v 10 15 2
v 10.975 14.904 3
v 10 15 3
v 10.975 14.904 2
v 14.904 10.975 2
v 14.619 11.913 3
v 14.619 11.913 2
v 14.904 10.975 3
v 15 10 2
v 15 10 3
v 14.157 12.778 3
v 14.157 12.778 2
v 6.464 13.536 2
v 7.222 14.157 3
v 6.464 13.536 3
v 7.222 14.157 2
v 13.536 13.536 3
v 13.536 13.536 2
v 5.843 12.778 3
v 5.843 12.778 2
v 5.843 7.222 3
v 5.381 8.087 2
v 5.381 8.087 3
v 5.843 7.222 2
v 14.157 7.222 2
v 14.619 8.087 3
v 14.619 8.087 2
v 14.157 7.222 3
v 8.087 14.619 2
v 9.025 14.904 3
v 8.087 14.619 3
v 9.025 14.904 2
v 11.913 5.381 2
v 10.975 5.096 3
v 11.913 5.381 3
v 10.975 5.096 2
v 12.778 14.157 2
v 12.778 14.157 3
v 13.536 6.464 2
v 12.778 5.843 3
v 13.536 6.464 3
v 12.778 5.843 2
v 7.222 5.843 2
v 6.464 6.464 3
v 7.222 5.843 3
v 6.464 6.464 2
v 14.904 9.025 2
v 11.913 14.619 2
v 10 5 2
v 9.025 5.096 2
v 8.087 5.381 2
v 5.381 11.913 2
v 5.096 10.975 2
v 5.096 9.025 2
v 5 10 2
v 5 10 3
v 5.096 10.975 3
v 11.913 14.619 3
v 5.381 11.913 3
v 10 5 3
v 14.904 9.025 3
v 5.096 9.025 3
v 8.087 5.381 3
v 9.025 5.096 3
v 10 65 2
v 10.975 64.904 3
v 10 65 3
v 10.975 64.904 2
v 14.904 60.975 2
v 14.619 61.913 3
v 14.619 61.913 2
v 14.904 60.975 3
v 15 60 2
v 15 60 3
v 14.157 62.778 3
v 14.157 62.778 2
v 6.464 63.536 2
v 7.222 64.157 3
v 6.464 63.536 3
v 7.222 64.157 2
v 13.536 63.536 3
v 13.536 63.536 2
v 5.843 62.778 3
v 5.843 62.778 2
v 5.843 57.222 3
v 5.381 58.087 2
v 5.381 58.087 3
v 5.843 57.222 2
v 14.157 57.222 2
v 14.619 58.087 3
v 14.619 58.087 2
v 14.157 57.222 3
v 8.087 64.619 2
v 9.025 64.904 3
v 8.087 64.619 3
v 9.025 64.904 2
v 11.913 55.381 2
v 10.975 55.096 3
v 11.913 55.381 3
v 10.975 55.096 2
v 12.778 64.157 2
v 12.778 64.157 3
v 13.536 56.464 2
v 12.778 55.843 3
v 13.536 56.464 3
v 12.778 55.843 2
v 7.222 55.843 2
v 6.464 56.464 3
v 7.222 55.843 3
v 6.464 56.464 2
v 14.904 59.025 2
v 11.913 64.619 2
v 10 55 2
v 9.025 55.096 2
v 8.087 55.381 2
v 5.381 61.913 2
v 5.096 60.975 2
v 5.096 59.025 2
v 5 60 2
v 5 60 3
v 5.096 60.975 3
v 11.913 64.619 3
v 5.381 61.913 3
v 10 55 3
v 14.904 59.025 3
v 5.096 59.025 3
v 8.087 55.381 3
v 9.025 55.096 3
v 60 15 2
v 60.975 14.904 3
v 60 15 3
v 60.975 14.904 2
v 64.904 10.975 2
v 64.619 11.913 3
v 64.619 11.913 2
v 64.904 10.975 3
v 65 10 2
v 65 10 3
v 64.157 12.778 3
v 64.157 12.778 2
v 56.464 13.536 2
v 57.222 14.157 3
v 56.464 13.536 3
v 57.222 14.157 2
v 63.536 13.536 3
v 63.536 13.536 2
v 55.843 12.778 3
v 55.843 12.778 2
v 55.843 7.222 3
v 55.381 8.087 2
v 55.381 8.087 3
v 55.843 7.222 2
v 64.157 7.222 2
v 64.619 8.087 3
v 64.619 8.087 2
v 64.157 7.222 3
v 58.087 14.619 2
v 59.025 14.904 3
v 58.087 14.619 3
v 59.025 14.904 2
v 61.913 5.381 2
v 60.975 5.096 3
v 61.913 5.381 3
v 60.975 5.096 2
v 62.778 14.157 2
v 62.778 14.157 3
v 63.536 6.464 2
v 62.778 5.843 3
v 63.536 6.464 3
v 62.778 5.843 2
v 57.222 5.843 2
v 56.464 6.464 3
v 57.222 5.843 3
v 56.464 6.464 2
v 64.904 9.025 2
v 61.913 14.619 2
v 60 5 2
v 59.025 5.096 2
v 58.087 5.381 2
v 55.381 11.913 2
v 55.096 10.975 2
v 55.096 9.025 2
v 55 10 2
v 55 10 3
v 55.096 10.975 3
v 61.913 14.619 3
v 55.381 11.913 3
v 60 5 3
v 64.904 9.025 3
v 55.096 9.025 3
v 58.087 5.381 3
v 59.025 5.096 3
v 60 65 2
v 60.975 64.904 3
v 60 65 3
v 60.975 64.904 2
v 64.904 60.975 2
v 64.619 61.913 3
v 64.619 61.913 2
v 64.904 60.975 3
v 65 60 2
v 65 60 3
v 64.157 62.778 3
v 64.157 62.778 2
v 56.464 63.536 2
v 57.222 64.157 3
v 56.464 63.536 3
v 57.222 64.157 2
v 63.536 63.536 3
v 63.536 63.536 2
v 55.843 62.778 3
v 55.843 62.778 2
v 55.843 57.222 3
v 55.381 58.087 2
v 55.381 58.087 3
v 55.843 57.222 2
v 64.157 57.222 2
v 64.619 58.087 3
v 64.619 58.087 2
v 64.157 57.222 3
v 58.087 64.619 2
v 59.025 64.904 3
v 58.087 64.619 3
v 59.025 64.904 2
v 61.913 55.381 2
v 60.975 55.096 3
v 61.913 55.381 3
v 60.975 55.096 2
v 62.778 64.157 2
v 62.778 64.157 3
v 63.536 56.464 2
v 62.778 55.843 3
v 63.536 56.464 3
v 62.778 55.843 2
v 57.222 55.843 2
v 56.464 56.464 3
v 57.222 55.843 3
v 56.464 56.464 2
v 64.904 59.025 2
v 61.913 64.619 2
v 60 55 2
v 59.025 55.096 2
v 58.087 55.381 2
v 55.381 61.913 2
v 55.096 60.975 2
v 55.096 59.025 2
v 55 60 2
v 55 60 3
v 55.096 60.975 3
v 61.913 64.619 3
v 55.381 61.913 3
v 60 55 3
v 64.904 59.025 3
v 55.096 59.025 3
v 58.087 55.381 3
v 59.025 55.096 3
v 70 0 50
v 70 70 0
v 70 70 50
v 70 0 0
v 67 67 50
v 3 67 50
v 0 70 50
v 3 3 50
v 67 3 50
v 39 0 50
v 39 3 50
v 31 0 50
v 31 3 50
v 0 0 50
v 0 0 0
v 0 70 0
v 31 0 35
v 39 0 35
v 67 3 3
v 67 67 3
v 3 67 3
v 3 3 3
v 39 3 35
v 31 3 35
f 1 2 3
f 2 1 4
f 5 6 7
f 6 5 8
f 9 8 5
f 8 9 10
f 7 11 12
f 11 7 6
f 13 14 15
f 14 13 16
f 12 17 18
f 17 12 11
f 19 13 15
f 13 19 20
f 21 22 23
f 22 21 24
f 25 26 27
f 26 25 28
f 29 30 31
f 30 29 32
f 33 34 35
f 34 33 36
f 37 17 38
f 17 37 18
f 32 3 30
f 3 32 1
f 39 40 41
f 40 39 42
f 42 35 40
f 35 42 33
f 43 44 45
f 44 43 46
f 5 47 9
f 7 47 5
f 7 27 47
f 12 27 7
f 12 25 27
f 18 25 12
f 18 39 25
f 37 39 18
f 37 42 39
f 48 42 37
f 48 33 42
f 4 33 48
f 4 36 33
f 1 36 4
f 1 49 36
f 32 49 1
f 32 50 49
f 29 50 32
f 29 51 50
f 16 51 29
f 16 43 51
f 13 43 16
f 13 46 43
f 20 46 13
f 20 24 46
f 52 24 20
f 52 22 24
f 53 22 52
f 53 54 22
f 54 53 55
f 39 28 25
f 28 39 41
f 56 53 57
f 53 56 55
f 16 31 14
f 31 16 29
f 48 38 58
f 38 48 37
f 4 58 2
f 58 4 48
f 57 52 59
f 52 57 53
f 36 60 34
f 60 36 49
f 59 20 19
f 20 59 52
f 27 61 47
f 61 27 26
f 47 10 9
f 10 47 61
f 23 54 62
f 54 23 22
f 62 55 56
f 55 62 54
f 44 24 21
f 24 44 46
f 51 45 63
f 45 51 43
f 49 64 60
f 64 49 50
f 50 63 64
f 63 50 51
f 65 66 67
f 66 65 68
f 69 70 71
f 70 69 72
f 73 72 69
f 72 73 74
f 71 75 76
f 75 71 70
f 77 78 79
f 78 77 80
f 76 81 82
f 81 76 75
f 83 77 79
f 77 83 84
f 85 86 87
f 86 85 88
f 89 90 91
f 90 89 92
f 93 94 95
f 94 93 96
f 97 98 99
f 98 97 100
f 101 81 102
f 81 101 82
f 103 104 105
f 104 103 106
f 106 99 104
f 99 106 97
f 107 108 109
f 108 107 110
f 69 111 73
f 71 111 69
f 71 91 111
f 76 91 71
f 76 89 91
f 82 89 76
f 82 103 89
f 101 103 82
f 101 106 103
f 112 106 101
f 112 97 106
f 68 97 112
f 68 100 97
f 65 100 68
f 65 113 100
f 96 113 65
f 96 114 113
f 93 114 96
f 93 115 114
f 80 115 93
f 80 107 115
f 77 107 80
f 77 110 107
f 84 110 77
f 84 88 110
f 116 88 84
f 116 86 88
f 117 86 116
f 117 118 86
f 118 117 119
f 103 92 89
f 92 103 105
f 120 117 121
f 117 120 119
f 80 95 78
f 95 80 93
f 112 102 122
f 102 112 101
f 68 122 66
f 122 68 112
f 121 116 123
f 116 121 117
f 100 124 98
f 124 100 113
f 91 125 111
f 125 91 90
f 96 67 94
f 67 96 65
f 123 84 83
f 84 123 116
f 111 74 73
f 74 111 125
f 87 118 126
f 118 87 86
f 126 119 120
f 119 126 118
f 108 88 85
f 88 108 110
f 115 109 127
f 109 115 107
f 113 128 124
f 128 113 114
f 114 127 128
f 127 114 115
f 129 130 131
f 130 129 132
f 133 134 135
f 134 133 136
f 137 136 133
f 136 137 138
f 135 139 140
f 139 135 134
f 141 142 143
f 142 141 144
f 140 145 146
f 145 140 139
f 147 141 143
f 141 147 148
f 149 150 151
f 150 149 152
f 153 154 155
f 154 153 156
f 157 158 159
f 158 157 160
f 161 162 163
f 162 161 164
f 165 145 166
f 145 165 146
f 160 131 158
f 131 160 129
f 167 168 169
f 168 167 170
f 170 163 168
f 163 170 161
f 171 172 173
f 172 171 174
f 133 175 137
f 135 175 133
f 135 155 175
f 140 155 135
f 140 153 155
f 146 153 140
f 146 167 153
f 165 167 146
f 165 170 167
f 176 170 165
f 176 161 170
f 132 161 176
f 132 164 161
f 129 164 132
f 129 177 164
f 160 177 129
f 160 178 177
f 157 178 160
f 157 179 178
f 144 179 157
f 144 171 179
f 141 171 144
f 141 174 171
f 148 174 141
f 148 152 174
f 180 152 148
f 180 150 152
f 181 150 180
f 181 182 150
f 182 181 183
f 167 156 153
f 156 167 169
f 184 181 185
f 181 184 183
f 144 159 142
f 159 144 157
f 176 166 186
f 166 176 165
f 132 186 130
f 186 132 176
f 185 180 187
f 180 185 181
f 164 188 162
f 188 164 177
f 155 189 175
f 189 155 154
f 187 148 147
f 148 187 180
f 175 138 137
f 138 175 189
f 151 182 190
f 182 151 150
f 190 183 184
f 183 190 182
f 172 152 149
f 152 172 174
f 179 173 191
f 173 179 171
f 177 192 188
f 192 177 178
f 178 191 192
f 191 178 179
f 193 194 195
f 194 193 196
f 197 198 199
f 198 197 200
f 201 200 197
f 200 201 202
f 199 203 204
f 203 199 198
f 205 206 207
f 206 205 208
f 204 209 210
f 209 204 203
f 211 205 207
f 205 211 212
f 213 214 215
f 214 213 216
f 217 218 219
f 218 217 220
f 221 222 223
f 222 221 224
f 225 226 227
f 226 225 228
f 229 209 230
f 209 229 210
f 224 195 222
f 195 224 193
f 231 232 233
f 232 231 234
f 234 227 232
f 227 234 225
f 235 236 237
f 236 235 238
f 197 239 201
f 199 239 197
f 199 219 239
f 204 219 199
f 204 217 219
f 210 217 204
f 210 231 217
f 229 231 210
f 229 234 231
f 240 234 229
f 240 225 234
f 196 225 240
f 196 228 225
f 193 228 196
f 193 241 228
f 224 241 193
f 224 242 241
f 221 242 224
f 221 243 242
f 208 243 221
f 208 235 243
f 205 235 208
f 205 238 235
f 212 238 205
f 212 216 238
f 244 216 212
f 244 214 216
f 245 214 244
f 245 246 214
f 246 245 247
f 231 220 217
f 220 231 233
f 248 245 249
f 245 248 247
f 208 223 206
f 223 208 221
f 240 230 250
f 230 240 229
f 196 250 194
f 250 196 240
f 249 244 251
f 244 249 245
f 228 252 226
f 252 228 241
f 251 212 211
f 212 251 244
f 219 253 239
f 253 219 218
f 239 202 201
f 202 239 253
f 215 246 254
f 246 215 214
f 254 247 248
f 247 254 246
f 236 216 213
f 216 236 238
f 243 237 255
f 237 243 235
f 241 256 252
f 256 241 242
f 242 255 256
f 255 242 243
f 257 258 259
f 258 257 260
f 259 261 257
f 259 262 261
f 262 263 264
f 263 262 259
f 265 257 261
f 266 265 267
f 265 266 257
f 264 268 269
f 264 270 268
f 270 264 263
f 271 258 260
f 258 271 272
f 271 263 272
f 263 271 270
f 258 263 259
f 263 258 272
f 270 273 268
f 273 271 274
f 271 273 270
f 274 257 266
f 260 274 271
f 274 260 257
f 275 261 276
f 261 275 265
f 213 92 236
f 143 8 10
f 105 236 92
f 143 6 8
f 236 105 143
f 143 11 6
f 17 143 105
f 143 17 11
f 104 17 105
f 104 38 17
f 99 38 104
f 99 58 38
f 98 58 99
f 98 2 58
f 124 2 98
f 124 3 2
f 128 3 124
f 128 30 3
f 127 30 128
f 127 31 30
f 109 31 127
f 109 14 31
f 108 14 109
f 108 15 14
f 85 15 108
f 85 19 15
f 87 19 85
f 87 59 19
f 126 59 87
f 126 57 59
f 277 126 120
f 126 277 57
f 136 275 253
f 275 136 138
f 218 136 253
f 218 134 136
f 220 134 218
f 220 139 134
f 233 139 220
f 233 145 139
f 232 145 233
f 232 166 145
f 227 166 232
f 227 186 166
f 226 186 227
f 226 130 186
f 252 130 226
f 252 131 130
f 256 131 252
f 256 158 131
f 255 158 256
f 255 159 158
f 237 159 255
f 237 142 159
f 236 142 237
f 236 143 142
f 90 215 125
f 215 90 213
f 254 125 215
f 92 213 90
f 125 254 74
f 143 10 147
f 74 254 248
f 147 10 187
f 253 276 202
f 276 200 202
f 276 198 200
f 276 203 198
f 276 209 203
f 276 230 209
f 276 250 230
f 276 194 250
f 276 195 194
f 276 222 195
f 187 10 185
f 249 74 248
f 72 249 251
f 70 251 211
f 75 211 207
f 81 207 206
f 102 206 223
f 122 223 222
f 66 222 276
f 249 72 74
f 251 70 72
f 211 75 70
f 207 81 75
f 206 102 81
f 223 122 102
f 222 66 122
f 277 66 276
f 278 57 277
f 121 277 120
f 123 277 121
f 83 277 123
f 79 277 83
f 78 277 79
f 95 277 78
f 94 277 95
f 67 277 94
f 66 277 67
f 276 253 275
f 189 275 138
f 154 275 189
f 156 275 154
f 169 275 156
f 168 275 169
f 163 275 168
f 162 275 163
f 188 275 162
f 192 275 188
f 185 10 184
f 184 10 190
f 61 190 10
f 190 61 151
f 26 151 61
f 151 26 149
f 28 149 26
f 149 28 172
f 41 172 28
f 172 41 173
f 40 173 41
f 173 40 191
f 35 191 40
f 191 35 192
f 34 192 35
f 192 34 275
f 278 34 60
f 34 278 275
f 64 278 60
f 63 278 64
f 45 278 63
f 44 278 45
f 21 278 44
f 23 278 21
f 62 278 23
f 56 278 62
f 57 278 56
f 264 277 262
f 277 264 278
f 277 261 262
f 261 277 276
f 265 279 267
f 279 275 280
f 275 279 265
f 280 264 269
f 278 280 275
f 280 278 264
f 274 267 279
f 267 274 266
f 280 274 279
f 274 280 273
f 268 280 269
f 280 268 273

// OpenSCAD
$fn = 32;

// ----------------------------------------------------------------------
// Enclosure box: both enclosure
// ----------------------------------------------------------------------

// --- parameters (mm) ---
box_l = 70;               // outer length, X
box_w = 70;               // outer width, Y
box_h = 50;               // outer height
wall_t = 3;               // wall thickness
boss_r = 5;               // corner boss radius
hole_r = 1.5;             // boss screw hole radius
boss_in = 10;             // boss inset from the corners
notch_w = 8;              // cable notch width
notch_h = 15;             // cable notch height

inner_h = box_h - wall_t;  // cavity depth
boss_h = inner_h - 2;  // corner boss height

difference() {
  cube([box_l, box_w, box_h]);
  translate([wall_t, wall_t, wall_t])
    cube([box_l - 2 * wall_t, box_w - 2 * wall_t, box_h]);
  for (sx = [0, 1], sy = [0, 1])
    translate([sx ? box_l - boss_in : boss_in,
               sy ? box_w - boss_in : boss_in, wall_t - 1]) {
      cylinder(r = boss_r, h = boss_h);
      translate([0, 0, boss_h - 4])
        cylinder(r = hole_r, h = 5);
    }
  translate([box_l / 2 - notch_w / 2, -1, box_h - notch_h])
    cube([notch_w, wall_t + 2, notch_h + 1]);
}
